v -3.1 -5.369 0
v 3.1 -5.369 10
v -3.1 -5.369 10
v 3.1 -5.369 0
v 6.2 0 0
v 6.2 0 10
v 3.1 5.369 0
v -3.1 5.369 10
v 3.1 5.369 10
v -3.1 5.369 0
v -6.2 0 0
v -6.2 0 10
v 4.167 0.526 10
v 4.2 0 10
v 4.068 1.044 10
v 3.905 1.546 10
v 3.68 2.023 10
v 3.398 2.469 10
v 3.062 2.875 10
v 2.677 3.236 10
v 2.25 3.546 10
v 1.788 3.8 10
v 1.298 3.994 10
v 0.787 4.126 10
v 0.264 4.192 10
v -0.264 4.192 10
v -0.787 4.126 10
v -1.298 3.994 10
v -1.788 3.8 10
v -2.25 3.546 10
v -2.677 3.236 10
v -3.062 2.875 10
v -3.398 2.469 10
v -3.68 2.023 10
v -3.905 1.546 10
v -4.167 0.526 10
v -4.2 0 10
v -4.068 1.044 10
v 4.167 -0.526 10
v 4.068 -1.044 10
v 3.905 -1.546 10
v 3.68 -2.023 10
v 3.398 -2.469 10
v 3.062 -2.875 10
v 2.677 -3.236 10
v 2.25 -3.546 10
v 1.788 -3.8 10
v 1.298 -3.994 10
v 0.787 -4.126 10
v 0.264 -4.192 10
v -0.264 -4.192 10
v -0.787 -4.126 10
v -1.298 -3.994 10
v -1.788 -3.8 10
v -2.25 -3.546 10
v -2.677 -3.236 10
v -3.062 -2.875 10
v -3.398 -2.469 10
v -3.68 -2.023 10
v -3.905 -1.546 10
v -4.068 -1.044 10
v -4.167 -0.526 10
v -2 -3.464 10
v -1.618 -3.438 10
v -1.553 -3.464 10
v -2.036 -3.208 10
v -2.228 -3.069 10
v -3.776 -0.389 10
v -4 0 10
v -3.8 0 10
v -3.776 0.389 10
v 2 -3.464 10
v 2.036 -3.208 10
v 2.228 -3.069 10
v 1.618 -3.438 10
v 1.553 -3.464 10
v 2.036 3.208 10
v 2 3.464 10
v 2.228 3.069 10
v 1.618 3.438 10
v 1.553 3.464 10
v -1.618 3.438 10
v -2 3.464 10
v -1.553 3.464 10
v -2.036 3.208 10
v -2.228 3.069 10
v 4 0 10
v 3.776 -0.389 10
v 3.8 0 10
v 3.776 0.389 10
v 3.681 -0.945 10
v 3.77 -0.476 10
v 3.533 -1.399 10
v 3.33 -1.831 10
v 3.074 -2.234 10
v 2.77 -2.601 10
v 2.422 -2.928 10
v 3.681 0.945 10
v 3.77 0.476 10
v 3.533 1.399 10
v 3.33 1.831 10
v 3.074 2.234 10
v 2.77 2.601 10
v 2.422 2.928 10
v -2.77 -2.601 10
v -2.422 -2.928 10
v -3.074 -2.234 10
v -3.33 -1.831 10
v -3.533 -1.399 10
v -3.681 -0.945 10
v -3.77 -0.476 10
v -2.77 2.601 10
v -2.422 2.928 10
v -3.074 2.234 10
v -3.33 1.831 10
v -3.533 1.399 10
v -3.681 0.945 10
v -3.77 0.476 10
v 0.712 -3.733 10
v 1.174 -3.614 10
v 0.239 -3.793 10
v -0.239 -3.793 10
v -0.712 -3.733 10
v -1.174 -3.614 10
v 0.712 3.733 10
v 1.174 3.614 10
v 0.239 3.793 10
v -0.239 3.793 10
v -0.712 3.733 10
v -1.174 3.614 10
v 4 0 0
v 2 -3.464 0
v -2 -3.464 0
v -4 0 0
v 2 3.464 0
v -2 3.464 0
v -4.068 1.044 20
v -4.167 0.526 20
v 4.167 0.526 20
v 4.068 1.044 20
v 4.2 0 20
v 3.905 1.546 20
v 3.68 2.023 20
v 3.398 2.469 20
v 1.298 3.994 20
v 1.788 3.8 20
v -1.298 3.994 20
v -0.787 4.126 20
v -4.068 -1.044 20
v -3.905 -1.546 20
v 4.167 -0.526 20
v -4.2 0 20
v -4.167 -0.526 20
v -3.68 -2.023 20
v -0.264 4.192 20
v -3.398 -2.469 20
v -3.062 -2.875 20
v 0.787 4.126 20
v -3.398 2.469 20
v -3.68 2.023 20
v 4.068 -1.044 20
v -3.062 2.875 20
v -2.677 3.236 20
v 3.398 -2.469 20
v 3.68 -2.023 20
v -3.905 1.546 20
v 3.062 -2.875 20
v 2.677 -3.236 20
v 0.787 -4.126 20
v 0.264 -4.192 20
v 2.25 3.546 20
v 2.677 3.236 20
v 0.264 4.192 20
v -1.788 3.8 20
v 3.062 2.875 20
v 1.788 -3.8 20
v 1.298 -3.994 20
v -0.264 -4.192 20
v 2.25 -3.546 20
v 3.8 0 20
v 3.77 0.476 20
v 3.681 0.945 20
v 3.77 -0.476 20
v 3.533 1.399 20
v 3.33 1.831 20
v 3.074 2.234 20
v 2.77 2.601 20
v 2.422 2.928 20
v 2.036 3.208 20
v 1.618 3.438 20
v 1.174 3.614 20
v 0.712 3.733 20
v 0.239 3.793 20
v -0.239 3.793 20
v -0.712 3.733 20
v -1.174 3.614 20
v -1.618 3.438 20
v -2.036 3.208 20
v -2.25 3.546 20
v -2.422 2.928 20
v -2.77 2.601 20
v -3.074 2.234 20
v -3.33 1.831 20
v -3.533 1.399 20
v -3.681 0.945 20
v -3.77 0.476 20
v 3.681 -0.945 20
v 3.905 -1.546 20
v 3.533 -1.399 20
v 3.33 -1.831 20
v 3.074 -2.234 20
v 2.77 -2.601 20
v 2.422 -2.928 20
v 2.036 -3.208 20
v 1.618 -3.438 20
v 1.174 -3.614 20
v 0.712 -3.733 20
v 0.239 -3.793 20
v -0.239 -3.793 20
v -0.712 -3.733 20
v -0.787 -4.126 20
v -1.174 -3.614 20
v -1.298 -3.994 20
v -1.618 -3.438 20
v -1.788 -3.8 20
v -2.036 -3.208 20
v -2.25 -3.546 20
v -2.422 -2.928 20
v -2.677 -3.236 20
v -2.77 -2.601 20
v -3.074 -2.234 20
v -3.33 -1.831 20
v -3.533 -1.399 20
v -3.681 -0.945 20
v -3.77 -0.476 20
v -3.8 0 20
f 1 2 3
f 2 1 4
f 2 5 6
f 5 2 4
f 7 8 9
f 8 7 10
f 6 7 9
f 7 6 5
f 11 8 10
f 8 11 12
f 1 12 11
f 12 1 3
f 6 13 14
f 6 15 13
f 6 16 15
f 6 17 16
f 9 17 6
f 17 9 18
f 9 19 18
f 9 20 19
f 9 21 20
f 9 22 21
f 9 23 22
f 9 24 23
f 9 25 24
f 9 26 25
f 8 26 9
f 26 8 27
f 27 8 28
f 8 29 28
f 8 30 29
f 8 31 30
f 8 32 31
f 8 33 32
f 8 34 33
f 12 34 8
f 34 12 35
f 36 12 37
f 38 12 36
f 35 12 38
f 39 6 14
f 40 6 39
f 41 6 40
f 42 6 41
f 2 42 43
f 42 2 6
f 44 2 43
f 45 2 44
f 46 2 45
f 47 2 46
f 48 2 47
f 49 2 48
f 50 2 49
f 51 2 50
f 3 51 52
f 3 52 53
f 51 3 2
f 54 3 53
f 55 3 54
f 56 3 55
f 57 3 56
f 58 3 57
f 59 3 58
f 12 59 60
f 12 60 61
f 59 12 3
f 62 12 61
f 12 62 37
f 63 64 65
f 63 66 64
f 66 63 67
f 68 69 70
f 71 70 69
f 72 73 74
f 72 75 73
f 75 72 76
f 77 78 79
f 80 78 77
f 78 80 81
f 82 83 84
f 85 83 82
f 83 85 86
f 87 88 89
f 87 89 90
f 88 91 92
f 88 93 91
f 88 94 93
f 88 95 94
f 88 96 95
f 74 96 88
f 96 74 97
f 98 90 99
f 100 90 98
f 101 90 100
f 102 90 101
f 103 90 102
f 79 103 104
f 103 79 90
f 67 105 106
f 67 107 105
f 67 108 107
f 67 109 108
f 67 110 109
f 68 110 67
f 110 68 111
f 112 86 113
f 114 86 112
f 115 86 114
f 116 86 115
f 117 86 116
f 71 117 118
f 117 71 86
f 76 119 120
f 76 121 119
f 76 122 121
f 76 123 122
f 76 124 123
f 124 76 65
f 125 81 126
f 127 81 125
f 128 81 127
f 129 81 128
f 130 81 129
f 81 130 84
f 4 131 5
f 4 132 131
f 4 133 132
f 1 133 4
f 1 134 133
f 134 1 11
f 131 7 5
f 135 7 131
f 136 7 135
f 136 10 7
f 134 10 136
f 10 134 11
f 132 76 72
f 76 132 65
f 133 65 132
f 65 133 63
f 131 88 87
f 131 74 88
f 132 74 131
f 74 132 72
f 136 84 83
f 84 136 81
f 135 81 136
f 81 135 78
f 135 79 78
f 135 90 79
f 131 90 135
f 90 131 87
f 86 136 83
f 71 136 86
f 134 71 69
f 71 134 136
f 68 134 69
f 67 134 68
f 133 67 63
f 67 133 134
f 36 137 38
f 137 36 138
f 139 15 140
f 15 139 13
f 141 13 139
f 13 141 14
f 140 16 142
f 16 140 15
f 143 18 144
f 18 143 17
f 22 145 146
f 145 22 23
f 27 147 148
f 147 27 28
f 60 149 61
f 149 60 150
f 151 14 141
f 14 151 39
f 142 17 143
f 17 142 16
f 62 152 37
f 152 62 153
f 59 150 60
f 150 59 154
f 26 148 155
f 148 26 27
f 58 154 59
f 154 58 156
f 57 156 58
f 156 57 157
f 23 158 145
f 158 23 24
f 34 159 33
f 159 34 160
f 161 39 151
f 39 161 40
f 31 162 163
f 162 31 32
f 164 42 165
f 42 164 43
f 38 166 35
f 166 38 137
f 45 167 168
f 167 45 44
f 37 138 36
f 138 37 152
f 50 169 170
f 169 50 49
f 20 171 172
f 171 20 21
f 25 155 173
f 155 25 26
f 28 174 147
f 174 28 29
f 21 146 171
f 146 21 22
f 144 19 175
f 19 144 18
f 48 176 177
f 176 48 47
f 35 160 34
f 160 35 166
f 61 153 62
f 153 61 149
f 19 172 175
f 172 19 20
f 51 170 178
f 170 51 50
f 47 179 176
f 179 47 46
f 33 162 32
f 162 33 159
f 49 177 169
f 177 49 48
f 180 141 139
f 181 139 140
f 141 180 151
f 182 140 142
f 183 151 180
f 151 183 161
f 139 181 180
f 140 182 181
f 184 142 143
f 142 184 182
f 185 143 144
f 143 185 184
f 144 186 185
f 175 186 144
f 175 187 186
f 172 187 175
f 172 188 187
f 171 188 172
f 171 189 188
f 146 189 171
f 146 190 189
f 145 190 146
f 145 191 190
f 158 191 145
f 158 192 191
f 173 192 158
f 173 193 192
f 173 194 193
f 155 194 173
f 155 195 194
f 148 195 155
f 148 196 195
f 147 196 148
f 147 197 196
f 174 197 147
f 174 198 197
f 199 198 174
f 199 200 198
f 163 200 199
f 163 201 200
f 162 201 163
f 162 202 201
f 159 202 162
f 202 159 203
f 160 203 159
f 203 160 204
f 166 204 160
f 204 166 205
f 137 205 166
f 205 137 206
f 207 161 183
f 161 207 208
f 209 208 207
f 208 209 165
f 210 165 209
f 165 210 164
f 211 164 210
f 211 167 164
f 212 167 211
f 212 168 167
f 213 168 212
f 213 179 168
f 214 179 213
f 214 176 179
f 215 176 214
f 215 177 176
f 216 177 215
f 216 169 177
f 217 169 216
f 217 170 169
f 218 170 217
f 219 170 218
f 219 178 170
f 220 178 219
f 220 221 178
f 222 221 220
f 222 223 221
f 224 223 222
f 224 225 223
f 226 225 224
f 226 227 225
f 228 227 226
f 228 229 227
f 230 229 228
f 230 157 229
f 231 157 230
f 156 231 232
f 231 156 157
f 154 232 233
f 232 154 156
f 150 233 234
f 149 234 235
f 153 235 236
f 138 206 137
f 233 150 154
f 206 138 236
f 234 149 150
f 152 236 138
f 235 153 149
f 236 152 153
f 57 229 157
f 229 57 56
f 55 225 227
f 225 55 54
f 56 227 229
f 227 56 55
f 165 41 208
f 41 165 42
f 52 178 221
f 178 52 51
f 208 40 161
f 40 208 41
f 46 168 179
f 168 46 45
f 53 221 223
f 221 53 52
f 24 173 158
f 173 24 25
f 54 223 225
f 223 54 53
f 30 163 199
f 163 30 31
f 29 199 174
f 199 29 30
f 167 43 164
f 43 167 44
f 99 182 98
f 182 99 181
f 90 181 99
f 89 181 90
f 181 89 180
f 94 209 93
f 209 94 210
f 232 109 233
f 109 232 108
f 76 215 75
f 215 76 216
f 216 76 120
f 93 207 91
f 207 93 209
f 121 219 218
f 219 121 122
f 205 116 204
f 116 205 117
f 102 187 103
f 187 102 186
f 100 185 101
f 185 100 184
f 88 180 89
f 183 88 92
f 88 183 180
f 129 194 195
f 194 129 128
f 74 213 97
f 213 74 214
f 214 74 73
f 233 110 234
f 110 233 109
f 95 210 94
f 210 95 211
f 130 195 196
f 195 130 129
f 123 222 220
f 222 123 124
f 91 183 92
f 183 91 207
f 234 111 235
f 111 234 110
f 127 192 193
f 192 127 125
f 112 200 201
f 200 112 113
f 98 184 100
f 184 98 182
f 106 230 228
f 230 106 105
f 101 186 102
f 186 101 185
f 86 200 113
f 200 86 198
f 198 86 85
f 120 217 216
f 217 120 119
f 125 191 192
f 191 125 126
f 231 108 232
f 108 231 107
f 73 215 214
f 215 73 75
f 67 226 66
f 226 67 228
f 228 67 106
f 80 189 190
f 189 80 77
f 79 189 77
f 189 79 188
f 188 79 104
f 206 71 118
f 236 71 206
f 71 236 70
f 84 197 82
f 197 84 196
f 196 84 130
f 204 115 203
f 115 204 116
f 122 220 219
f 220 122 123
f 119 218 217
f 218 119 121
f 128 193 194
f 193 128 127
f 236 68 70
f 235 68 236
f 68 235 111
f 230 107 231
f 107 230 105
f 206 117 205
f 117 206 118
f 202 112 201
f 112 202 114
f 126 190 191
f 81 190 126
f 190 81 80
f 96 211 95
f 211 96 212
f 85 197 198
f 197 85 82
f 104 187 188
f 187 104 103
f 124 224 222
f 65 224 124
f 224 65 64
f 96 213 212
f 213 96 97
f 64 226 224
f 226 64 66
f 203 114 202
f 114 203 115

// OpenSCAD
OUTER_DIA = 12.4;
INNER_DIA = 8;

BEARING_INNER_DIA = 7.6;
BEARING_OUTER_DIA = 8.4;

HEIGHT = 10;
BEARING_HEIGHT = 10;

$fn = 50;

union() {
  difference() {
    cylinder(d = OUTER_DIA, h = HEIGHT, $fn = 6);
    cylinder(d = INNER_DIA, h = HEIGHT, $fn = 6);
  }
  translate([0, 0, HEIGHT])
  difference() {
    cylinder(d = BEARING_OUTER_DIA, h = BEARING_HEIGHT);
    cylinder(d = BEARING_INNER_DIA, h = BEARING_HEIGHT);
  }
}
